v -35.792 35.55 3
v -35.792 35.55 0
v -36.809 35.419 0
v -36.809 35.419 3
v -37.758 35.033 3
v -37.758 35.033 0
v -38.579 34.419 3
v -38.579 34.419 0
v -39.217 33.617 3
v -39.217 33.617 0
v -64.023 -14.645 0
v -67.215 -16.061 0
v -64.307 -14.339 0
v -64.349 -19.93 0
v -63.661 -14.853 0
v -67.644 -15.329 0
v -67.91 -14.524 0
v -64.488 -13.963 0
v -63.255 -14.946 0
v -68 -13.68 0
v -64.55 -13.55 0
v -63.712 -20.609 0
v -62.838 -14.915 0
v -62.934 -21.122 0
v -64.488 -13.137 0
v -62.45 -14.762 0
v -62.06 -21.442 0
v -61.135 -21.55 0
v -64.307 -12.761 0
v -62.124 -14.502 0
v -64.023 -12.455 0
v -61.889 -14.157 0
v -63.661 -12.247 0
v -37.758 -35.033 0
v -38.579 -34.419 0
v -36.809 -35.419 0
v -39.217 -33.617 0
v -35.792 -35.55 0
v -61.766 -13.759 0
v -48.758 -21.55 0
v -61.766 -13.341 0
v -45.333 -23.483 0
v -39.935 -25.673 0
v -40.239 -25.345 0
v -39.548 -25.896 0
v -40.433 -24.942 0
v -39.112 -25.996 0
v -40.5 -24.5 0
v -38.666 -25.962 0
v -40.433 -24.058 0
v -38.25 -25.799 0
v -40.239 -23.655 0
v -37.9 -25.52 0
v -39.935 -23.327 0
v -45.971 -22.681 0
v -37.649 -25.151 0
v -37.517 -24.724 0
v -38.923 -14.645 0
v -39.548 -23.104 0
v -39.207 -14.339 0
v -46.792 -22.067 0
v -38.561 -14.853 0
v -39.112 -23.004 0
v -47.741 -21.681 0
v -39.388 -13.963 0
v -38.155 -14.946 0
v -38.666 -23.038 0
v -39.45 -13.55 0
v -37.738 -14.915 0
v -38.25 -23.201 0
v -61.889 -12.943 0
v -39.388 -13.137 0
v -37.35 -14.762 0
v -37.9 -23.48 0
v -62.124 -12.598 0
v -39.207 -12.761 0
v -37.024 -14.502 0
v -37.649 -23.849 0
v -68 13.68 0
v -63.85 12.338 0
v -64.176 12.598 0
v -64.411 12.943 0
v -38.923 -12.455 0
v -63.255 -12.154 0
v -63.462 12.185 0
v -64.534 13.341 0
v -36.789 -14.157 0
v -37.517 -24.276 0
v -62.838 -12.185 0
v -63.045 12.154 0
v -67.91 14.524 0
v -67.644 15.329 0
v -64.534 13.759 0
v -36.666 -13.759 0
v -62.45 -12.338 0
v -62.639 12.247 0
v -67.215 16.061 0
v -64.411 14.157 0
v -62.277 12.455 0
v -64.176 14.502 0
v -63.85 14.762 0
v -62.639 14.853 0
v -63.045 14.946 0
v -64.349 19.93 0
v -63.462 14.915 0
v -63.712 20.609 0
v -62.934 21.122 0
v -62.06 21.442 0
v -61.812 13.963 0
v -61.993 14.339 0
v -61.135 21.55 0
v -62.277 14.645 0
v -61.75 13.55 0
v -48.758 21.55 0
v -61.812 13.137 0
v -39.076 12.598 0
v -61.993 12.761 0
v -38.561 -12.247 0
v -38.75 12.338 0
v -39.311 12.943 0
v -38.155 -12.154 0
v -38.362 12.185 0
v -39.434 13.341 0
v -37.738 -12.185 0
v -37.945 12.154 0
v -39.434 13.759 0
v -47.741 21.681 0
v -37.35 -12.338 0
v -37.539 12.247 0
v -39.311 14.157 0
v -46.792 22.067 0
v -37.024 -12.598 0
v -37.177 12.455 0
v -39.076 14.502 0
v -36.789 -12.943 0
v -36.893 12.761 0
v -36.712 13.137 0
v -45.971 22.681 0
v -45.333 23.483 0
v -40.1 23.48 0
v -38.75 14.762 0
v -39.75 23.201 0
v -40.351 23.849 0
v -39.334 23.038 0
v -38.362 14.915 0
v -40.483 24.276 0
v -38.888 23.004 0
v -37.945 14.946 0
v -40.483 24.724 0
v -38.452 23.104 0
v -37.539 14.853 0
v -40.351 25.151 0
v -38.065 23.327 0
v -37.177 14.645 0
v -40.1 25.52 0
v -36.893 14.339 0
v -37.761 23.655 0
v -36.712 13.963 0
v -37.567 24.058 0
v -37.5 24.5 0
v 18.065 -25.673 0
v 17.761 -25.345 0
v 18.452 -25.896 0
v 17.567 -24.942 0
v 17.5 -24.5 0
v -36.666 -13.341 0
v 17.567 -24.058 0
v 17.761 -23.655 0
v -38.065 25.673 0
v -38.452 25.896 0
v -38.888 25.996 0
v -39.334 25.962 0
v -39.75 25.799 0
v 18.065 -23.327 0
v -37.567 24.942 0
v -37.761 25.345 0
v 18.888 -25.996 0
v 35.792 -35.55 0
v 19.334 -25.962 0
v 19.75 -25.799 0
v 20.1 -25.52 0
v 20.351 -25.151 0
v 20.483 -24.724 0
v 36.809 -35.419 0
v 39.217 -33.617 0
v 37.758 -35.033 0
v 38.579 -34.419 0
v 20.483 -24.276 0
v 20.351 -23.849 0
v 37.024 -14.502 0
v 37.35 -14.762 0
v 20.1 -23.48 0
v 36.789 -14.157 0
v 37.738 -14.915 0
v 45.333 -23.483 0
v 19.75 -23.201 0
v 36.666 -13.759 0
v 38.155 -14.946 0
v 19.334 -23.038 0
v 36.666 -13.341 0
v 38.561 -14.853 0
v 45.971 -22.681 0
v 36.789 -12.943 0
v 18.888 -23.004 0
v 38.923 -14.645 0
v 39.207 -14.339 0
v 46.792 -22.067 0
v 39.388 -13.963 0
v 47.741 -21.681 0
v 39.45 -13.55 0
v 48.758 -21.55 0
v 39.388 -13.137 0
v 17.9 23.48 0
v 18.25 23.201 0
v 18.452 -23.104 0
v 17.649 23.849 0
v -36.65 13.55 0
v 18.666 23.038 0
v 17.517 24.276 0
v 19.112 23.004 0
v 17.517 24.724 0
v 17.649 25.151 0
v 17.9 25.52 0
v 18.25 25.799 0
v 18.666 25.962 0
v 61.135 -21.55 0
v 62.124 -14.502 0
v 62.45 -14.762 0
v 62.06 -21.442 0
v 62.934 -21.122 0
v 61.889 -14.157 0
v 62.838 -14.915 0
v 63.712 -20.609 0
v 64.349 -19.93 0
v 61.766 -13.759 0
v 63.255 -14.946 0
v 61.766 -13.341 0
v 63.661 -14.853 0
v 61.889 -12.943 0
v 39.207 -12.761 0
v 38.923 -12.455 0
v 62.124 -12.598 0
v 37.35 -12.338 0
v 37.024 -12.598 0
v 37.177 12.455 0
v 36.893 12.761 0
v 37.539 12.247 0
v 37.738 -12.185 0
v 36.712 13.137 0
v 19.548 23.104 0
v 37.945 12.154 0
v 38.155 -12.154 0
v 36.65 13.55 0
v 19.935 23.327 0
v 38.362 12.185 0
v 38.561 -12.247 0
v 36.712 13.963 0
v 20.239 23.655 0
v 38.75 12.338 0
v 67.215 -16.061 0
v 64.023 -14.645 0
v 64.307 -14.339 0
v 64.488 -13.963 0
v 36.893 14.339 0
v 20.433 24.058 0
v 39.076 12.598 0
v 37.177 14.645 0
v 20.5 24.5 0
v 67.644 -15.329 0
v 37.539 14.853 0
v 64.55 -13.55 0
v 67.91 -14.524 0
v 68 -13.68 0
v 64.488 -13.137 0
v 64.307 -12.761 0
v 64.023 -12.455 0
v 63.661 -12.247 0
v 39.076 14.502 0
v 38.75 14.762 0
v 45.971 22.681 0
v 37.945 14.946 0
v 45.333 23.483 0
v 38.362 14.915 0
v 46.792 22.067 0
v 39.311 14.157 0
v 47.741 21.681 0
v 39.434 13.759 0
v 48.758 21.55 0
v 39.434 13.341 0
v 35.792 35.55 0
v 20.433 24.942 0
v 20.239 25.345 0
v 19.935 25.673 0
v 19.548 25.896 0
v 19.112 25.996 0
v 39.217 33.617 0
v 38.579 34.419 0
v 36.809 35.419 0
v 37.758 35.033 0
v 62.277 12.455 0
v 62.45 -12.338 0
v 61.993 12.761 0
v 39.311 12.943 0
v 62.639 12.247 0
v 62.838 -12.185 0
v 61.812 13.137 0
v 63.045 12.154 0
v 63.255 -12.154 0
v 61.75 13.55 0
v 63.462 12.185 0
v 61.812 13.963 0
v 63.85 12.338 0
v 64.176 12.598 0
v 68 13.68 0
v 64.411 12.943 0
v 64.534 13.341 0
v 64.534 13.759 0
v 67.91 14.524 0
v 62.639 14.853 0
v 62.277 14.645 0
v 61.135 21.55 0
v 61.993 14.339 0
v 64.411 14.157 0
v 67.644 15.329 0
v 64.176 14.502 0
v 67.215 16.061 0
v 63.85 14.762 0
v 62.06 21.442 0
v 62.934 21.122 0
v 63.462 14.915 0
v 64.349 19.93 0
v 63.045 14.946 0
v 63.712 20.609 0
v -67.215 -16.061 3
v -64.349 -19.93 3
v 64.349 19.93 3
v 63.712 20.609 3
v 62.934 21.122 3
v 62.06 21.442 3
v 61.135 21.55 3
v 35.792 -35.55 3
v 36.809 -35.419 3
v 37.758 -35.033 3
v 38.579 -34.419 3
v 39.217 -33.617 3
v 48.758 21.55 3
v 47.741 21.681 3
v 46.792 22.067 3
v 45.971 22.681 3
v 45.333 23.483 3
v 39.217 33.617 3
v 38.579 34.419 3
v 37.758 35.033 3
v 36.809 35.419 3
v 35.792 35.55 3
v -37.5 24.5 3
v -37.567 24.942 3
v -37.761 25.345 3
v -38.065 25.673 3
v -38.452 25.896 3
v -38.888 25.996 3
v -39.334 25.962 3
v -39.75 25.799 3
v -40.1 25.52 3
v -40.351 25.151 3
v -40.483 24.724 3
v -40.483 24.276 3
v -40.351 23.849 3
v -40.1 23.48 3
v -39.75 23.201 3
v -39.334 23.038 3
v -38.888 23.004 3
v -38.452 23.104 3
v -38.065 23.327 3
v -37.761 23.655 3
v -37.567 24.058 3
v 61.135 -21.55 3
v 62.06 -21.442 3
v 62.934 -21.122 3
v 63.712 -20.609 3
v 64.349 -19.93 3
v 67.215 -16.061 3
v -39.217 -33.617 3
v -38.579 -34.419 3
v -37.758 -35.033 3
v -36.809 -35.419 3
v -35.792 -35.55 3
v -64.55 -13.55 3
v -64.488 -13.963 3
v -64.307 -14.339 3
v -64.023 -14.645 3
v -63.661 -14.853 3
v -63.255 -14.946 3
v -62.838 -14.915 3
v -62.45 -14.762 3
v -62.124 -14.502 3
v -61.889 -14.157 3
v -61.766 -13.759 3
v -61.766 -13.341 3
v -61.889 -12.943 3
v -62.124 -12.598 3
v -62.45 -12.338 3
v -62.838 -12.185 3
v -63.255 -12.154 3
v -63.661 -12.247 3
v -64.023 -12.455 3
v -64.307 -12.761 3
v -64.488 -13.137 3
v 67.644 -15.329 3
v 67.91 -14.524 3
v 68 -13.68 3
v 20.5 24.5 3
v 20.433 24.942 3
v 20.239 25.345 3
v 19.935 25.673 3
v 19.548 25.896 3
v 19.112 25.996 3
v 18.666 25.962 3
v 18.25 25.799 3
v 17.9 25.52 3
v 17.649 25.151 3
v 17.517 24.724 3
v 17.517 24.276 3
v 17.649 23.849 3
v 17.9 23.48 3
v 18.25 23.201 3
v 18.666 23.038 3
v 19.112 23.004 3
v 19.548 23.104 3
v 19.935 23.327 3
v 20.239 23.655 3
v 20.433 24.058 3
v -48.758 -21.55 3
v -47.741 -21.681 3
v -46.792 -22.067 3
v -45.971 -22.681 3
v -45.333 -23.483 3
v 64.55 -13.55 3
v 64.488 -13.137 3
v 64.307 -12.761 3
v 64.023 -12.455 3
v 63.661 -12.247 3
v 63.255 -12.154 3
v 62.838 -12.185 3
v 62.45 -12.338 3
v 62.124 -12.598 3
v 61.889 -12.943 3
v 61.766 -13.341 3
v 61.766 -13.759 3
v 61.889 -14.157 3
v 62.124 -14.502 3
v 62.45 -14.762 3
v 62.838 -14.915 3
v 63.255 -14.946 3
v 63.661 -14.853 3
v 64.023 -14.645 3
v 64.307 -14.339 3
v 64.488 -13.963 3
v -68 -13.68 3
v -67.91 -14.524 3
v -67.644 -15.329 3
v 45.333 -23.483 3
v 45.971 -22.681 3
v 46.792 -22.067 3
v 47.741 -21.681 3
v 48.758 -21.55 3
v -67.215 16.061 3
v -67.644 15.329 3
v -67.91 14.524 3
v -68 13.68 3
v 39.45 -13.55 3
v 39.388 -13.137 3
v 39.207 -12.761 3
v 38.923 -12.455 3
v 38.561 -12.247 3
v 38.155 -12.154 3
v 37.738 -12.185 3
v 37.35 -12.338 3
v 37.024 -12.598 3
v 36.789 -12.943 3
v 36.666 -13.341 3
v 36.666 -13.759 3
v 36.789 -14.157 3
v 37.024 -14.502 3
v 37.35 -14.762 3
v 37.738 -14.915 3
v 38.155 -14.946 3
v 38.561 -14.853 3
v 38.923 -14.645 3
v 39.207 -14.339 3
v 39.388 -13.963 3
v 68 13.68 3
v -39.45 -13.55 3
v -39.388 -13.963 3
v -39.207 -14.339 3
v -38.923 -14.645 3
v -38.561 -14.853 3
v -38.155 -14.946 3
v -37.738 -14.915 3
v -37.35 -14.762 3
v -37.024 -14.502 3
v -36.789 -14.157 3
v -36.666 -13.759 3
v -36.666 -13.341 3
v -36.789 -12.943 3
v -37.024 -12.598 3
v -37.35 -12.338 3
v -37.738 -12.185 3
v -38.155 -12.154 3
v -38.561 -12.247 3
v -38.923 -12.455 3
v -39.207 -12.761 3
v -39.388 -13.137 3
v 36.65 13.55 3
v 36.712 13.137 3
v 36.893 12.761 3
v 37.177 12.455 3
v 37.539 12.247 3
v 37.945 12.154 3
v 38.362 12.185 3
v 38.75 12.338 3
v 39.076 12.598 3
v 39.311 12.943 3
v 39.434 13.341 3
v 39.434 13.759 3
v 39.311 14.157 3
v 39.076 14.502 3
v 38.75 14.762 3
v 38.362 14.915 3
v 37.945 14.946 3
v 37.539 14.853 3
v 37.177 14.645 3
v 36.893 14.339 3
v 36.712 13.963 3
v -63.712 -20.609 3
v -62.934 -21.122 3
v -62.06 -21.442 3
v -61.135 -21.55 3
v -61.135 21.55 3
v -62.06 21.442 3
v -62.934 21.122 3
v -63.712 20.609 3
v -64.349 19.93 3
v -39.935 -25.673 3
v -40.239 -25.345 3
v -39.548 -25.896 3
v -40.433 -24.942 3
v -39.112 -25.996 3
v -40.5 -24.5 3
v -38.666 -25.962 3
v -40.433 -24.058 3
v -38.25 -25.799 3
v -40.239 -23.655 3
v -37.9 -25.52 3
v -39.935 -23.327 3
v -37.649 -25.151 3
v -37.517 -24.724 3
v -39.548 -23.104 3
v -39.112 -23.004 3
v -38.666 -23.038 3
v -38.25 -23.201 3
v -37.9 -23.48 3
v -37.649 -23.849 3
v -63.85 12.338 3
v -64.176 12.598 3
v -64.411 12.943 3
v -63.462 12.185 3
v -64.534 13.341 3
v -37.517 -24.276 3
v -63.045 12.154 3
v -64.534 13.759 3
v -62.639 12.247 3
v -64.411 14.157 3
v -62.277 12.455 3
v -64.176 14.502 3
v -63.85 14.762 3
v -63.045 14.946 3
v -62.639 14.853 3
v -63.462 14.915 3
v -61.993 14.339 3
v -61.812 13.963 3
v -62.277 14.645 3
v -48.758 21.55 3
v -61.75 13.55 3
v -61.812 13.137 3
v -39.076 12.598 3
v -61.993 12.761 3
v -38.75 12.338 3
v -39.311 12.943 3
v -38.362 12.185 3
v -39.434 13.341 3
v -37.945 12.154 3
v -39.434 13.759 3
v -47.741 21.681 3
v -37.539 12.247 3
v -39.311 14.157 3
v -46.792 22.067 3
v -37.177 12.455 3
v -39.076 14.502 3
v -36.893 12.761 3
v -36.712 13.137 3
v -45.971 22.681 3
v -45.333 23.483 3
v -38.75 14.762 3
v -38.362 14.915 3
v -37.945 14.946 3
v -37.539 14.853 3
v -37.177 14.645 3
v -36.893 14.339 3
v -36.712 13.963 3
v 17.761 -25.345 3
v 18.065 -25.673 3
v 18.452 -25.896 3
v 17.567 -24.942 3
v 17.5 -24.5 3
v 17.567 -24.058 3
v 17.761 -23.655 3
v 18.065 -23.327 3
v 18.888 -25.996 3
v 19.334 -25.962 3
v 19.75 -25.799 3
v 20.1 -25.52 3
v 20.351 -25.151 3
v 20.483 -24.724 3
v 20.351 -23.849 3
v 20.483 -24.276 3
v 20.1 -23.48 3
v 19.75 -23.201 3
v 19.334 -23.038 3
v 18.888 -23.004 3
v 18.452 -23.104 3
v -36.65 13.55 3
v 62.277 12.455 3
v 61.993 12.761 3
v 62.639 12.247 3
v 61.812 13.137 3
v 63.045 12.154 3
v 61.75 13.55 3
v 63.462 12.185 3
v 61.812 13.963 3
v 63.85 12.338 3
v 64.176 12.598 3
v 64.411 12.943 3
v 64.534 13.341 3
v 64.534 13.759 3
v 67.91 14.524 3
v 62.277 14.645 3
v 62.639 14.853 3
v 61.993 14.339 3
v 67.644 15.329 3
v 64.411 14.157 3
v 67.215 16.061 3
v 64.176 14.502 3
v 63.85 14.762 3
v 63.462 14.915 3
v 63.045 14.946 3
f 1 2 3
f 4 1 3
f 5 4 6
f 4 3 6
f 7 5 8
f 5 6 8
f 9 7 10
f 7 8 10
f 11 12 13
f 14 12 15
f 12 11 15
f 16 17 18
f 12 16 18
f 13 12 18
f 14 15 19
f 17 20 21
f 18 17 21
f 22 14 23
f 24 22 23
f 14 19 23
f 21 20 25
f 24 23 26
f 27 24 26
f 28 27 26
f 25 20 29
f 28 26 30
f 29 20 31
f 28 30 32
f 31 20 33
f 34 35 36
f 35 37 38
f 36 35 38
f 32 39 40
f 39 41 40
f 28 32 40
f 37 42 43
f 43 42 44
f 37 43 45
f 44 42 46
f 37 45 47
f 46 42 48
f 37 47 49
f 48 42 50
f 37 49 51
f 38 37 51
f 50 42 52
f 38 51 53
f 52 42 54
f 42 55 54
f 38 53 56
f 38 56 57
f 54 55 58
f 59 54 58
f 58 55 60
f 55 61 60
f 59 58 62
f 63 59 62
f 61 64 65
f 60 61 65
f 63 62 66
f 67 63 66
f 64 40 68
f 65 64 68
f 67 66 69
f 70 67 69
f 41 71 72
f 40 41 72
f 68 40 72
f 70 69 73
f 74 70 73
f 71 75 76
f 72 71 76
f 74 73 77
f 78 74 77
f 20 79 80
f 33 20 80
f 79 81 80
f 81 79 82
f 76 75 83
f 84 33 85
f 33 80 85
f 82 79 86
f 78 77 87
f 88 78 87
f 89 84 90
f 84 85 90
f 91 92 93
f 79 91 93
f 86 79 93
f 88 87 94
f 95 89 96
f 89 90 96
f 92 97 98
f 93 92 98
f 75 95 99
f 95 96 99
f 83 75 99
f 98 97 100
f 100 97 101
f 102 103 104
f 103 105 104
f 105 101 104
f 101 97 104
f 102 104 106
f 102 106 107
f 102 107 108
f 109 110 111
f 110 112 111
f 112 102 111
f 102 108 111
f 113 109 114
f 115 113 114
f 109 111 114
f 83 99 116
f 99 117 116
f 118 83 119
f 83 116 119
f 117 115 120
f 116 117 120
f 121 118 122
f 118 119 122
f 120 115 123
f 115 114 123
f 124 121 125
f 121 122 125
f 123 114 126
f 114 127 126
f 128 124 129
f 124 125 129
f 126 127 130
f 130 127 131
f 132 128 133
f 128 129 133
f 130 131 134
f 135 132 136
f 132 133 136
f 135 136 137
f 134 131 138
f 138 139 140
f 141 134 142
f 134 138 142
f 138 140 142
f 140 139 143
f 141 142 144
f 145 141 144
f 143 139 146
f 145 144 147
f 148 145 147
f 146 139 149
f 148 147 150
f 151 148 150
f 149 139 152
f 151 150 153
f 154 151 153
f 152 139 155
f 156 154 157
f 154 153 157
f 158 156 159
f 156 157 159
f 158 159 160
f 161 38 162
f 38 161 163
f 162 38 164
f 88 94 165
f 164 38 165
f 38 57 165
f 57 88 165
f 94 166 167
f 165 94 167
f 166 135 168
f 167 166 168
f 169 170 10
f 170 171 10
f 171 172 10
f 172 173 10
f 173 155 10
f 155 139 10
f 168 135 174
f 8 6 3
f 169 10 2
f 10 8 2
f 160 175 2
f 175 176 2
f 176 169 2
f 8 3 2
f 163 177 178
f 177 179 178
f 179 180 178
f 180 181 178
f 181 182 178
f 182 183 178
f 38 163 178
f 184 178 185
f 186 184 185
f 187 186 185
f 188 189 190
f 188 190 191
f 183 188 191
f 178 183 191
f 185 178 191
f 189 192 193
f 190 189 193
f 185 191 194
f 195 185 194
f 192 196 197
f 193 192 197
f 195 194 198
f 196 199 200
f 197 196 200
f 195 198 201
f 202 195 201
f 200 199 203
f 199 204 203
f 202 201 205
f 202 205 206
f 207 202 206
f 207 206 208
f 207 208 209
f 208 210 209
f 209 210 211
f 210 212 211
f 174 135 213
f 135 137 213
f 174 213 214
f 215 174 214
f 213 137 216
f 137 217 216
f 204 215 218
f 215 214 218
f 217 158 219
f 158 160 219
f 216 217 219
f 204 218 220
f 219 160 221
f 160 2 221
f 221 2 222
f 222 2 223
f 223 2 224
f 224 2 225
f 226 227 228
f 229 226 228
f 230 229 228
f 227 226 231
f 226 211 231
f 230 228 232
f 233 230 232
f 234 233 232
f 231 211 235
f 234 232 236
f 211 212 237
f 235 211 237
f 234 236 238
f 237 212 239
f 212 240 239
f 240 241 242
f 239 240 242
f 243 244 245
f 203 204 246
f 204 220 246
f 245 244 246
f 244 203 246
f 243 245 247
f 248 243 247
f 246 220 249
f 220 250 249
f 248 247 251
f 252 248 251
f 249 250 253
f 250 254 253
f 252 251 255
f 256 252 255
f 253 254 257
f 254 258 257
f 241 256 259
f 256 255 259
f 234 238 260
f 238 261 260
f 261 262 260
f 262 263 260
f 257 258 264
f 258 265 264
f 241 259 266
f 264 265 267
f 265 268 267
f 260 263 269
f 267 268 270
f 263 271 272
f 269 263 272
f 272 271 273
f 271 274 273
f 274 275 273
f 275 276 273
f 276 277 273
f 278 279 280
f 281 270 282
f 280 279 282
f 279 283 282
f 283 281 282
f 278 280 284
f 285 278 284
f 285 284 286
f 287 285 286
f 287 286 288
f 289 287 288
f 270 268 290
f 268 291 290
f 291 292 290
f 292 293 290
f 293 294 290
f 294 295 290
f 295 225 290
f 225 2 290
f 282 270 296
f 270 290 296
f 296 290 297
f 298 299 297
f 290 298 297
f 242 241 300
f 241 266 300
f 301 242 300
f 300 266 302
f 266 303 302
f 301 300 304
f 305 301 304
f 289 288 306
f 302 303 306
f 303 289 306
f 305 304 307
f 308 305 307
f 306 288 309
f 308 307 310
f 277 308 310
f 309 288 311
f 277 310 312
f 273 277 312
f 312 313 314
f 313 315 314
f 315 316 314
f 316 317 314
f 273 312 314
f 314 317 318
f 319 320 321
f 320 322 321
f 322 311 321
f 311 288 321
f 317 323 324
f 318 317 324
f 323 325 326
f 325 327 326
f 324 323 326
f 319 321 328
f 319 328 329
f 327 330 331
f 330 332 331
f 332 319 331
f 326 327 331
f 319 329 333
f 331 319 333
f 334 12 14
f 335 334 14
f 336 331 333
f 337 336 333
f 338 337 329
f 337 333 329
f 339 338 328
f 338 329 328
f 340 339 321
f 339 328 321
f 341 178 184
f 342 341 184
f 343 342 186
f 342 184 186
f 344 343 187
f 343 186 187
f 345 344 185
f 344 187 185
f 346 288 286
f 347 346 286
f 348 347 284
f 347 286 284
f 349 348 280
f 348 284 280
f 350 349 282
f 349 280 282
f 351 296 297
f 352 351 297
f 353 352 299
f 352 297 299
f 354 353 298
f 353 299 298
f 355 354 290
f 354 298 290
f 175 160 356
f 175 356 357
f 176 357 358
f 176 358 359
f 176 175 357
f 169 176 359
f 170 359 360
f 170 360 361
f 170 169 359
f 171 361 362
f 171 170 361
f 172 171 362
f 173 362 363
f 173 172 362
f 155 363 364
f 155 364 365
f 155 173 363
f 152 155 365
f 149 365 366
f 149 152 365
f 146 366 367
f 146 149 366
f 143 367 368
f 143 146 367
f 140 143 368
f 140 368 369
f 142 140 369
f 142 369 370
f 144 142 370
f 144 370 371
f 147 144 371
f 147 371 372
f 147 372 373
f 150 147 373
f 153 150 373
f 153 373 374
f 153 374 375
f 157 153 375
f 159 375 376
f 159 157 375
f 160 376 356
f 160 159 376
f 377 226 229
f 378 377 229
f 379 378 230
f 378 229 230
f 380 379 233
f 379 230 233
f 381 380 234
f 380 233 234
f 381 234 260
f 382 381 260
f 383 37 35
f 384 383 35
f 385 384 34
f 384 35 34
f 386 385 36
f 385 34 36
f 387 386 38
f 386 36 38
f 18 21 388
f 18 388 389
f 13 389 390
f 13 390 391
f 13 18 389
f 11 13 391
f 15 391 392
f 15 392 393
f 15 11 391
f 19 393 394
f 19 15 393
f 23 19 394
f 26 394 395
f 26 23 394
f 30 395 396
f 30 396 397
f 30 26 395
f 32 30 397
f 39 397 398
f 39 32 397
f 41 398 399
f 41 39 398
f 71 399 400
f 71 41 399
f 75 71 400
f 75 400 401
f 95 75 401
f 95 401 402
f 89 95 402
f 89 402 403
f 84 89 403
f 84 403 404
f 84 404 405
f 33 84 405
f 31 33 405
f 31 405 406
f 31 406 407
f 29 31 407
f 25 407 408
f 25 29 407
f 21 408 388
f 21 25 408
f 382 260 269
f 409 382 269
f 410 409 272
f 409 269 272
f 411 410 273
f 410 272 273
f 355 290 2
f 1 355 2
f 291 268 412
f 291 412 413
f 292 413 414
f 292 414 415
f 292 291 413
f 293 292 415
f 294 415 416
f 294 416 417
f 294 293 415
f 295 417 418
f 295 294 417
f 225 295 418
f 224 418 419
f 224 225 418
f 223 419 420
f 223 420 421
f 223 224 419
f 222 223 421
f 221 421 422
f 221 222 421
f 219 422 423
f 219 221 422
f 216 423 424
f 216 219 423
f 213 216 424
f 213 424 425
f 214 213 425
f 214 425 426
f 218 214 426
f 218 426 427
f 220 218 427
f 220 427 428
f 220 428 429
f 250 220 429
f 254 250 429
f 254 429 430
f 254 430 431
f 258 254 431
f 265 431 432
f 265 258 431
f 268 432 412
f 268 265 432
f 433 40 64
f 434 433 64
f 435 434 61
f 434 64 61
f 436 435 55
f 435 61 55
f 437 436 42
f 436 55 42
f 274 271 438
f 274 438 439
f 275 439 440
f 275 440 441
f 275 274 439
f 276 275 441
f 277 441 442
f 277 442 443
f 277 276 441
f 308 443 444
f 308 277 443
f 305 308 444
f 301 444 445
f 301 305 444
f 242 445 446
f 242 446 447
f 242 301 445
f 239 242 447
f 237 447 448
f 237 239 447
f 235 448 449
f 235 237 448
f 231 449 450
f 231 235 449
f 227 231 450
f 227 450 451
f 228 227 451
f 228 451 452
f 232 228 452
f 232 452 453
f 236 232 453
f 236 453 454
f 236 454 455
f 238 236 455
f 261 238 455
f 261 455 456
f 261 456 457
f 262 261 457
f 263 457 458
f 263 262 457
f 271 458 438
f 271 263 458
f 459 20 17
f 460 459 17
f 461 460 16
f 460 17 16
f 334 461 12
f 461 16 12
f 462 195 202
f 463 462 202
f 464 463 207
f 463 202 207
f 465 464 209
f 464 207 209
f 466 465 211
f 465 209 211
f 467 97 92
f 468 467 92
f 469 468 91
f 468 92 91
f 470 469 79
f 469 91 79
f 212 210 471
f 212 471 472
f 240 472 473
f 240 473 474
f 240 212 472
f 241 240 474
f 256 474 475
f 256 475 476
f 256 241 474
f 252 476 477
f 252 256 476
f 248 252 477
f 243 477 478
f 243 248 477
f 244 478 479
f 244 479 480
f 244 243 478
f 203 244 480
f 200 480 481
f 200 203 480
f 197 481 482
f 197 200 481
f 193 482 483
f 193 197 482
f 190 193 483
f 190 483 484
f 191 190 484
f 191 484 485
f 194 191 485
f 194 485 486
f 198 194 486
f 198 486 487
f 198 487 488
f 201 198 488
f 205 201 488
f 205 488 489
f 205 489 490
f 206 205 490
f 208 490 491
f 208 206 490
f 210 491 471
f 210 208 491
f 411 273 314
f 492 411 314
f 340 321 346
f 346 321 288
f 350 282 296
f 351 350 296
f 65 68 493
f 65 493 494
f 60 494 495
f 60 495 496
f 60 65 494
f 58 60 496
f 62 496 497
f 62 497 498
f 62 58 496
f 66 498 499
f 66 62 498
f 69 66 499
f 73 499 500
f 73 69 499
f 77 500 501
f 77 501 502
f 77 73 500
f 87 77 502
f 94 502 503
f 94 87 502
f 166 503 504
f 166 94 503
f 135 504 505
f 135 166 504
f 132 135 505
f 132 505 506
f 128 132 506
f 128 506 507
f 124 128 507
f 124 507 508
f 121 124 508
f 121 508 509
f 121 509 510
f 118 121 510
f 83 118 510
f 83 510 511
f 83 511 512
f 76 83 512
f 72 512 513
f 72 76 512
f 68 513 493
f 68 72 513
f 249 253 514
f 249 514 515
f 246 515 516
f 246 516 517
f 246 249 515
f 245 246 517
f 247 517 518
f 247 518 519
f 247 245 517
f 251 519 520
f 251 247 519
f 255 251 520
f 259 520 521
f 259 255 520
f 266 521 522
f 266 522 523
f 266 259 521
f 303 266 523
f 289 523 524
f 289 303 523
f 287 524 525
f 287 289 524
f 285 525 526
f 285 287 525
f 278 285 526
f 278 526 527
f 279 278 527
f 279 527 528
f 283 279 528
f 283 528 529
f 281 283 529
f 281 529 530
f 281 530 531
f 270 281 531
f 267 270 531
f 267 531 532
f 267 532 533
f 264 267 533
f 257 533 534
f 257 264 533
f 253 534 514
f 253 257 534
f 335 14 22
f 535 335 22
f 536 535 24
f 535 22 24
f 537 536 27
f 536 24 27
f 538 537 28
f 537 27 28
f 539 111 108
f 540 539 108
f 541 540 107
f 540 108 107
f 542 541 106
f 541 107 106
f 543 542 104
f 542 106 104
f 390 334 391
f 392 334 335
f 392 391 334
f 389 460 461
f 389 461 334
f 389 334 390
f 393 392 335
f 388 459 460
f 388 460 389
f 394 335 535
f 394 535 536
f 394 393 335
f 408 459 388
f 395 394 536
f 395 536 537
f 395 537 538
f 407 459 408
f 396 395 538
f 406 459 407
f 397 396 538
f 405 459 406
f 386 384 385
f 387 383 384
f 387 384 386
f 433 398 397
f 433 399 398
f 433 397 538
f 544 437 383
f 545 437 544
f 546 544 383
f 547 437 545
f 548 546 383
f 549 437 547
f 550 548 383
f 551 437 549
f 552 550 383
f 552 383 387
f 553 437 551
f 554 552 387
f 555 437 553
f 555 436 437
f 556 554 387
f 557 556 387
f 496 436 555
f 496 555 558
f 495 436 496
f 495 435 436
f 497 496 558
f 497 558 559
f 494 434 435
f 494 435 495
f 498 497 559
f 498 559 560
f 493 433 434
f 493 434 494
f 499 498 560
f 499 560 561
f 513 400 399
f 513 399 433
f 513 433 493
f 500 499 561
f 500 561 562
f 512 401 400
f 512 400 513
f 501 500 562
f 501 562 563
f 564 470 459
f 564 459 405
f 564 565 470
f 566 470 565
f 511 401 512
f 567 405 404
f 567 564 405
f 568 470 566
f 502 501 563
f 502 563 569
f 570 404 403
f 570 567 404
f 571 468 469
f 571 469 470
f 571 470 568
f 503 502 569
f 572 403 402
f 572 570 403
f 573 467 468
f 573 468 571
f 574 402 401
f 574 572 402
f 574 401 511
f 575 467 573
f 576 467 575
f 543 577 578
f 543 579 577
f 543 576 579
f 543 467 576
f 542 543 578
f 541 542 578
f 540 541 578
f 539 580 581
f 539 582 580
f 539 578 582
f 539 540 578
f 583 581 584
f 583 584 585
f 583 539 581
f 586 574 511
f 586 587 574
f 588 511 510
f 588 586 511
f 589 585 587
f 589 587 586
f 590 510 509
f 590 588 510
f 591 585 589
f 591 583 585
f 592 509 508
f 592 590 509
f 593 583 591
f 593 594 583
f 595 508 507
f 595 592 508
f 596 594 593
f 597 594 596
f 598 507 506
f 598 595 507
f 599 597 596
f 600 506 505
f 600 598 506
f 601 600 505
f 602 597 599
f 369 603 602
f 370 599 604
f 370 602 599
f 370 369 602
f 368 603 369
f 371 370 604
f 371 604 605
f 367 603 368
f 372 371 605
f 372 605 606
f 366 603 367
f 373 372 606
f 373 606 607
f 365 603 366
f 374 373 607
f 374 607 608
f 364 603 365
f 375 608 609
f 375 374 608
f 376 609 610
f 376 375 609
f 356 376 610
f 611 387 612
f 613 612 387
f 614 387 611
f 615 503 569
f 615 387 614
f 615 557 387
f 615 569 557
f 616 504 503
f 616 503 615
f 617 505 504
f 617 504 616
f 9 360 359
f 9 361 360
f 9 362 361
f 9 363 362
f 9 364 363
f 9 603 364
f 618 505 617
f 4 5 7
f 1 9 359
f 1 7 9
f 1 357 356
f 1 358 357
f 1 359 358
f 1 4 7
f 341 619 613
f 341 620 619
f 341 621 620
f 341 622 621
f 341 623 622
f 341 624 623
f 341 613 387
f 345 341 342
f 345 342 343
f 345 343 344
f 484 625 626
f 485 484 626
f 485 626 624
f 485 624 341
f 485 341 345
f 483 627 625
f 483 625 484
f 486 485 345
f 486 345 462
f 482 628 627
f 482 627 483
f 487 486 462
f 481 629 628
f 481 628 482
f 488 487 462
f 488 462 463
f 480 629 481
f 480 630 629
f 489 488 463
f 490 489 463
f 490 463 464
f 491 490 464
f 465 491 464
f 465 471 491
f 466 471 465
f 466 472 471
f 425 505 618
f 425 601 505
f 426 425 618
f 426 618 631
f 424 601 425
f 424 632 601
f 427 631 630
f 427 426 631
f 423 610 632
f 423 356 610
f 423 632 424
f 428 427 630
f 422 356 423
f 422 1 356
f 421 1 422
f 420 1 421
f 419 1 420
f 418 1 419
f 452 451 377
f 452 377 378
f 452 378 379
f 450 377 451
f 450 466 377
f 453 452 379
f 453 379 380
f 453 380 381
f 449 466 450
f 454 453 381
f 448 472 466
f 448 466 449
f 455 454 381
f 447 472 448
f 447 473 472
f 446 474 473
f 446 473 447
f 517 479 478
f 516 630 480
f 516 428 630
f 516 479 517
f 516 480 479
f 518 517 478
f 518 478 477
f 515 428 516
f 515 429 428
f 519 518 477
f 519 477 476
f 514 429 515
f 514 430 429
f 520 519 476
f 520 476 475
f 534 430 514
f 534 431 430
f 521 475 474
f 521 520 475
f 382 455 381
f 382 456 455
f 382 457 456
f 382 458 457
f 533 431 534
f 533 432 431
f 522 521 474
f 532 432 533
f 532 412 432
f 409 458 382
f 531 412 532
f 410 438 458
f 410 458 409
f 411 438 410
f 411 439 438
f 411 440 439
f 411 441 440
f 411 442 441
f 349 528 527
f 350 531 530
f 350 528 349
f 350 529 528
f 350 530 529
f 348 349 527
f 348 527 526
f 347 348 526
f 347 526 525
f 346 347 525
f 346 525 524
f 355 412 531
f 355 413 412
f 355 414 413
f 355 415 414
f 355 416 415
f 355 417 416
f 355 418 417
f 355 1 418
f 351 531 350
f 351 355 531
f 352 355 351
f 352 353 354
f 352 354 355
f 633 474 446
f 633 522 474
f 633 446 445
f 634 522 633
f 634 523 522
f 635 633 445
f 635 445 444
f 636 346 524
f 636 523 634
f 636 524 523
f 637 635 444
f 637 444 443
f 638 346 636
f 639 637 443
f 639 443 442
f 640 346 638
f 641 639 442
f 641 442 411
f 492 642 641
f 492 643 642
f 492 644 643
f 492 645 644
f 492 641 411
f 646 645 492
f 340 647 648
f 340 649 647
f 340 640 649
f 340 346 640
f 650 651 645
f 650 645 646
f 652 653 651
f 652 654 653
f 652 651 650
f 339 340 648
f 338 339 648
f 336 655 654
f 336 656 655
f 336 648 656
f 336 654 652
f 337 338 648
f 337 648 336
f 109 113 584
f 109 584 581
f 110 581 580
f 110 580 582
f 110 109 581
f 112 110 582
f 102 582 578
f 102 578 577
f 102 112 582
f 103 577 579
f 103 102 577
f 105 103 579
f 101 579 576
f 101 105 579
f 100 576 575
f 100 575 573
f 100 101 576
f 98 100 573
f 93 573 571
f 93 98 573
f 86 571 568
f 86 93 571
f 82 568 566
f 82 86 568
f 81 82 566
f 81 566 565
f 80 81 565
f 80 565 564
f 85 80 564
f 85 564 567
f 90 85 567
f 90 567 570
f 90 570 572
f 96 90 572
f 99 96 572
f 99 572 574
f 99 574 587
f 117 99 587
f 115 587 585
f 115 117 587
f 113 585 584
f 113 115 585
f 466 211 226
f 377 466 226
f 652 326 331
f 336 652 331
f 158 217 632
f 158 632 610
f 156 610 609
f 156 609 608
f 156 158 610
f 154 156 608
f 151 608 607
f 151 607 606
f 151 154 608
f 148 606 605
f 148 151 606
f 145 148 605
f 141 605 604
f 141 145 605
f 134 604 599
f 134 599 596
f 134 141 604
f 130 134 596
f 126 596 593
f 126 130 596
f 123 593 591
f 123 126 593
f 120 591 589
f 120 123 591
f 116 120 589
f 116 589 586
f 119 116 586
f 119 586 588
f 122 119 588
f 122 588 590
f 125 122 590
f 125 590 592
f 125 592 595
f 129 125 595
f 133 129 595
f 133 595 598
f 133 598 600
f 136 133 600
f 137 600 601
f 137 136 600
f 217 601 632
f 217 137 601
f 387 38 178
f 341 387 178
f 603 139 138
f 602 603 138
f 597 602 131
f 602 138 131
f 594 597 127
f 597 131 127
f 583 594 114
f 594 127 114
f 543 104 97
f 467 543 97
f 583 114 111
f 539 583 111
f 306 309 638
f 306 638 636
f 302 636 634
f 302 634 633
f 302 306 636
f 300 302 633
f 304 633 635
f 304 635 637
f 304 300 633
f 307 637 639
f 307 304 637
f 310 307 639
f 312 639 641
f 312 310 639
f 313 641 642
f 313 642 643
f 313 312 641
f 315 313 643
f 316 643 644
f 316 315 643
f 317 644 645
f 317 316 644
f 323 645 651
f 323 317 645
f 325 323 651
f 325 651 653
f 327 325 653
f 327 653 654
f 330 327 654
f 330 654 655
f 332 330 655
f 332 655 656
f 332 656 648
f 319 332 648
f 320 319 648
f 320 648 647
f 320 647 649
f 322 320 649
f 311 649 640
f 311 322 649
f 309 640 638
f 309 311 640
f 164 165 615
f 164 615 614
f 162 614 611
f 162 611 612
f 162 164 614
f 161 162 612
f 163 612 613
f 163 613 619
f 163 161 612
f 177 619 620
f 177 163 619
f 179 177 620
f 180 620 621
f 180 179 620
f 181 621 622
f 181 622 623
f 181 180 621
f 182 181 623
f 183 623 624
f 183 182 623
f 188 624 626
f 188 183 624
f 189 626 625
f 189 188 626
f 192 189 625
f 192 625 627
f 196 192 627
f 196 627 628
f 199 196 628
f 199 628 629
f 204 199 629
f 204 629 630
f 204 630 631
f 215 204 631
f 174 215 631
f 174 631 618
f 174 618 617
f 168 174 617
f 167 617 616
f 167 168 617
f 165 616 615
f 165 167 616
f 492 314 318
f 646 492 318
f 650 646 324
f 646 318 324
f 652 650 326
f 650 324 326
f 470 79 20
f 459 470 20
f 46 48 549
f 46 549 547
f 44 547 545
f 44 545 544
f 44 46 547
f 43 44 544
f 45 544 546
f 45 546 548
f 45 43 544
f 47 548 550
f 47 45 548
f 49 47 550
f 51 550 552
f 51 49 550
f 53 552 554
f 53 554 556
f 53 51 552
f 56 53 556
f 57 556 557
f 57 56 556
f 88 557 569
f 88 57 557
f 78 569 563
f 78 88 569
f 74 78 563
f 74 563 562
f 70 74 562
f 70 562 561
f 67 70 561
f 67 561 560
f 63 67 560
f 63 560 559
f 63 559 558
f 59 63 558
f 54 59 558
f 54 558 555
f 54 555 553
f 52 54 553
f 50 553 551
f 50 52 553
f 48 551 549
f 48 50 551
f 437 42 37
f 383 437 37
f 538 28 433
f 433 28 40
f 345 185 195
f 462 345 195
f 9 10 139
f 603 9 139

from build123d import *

# Parameters (mm, degrees)
SKETCH1_R           = 1.4
SKETCH1_R_2         = 1.5
BOSS_EXTRUDE1_DEPTH = 3


with BuildPart() as part:
    # Sketch1 → Boss-Extrude1 (new body)
    with BuildSketch(Plane.XY):
        with BuildLine():
            Line((68, -13.680285878), (68, 13.680285878))
            ThreePointArc((68, 13.680285878), (67.79859538, 14.93355087), (67.21466343, 16.060609182))
            Line((67.21466343, 16.060609182), (64.349302592, 19.930323303))
            ThreePointArc((64.349302592, 19.930323303), (62.93445954, 21.122204726), (61.134639162, 21.55))
            Line((61.134639162, 21.55), (48.7578418, 21.55))
            ThreePointArc((48.7578418, 21.55), (46.79161141, 22.066619738), (45.333277733, 23.483030974))
            Line((45.333277733, 23.483030974), (39.216722267, 33.616969026))
            ThreePointArc((39.216722267, 33.616969026), (37.75838859, 35.033380262), (35.7921582, 35.55))
            Line((35.7921582, 35.55), (-35.7921582, 35.55))
            ThreePointArc((-35.7921582, 35.55), (-37.75838859, 35.033380262), (-39.216722267, 33.616969026))
            Line((-39.216722267, 33.616969026), (-45.333277733, 23.483030974))
            ThreePointArc((-45.333277733, 23.483030974), (-46.79161141, 22.066619738), (-48.7578418, 21.55))
            Line((-48.7578418, 21.55), (-61.134639162, 21.55))
            ThreePointArc((-61.134639162, 21.55), (-62.93445954, 21.122204726), (-64.349302592, 19.930323303))
            Line((-64.349302592, 19.930323303), (-67.21466343, 16.060609182))
            ThreePointArc((-67.21466343, 16.060609182), (-67.79859538, 14.93355087), (-68, 13.680285878))
            Line((-68, 13.680285878), (-68, -13.680285878))
            ThreePointArc((-68, -13.680285878), (-67.79859538, -14.93355087), (-67.21466343, -16.060609182))
            Line((-67.21466343, -16.060609182), (-64.349302592, -19.930323303))
            ThreePointArc((-64.349302592, -19.930323303), (-62.93445954, -21.122204726), (-61.134639162, -21.55))
            Line((-61.134639162, -21.55), (-48.7578418, -21.55))
            ThreePointArc((-48.7578418, -21.55), (-46.79161141, -22.066619738), (-45.333277733, -23.483030974))
            Line((-45.333277733, -23.483030974), (-39.216722267, -33.616969026))
            ThreePointArc((-39.216722267, -33.616969026), (-37.75838859, -35.033380262), (-35.7921582, -35.55))
            Line((-35.7921582, -35.55), (35.7921582, -35.55))
            ThreePointArc((35.7921582, -35.55), (37.75838859, -35.033380262), (39.216722267, -33.616969026))
            Line((39.216722267, -33.616969026), (45.333277733, -23.483030974))
            ThreePointArc((45.333277733, -23.483030974), (46.79161141, -22.066619738), (48.7578418, -21.55))
            Line((48.7578418, -21.55), (61.134639162, -21.55))
            ThreePointArc((61.134639162, -21.55), (62.93445954, -21.122204726), (64.349302592, -19.930323303))
            Line((64.349302592, -19.930323303), (67.21466343, -16.060609182))
            ThreePointArc((67.21466343, -16.060609182), (67.79859538, -14.93355087), (68, -13.680285878))
        make_face()
        with Locations((38.05, -13.55)):
            Circle(SKETCH1_R, mode=Mode.SUBTRACT)
        with Locations((63.15, -13.55)):
            Circle(SKETCH1_R, mode=Mode.SUBTRACT)
        with Locations(Location((63.15, 13.55, 0), (0, 0, 180))):
            Circle(SKETCH1_R, mode=Mode.SUBTRACT)
        with Locations(Location((38.05, 13.55, 0), (0, 0, 180))):
            Circle(SKETCH1_R, mode=Mode.SUBTRACT)
        with Locations(Location((-38.05, -13.55, 0), (0, 0, 180))):
            Circle(SKETCH1_R, mode=Mode.SUBTRACT)
        with Locations(Location((-63.15, -13.55, 0), (0, 0, 180))):
            Circle(SKETCH1_R, mode=Mode.SUBTRACT)
        with Locations((-63.15, 13.55)):
            Circle(SKETCH1_R, mode=Mode.SUBTRACT)
        with Locations((-38.05, 13.55)):
            Circle(SKETCH1_R, mode=Mode.SUBTRACT)
        with Locations((-39, 24.5)):
            Circle(SKETCH1_R_2, mode=Mode.SUBTRACT)
        with Locations((19, 24.5)):
            Circle(SKETCH1_R_2, mode=Mode.SUBTRACT)
        with Locations(Location((19, -24.5, 0), (0, 0, 180))):
            Circle(SKETCH1_R_2, mode=Mode.SUBTRACT)
        with Locations(Location((-39, -24.5, 0), (0, 0, 180))):
            Circle(SKETCH1_R_2, mode=Mode.SUBTRACT)
    extrude(amount=BOSS_EXTRUDE1_DEPTH)


solid = part.part
